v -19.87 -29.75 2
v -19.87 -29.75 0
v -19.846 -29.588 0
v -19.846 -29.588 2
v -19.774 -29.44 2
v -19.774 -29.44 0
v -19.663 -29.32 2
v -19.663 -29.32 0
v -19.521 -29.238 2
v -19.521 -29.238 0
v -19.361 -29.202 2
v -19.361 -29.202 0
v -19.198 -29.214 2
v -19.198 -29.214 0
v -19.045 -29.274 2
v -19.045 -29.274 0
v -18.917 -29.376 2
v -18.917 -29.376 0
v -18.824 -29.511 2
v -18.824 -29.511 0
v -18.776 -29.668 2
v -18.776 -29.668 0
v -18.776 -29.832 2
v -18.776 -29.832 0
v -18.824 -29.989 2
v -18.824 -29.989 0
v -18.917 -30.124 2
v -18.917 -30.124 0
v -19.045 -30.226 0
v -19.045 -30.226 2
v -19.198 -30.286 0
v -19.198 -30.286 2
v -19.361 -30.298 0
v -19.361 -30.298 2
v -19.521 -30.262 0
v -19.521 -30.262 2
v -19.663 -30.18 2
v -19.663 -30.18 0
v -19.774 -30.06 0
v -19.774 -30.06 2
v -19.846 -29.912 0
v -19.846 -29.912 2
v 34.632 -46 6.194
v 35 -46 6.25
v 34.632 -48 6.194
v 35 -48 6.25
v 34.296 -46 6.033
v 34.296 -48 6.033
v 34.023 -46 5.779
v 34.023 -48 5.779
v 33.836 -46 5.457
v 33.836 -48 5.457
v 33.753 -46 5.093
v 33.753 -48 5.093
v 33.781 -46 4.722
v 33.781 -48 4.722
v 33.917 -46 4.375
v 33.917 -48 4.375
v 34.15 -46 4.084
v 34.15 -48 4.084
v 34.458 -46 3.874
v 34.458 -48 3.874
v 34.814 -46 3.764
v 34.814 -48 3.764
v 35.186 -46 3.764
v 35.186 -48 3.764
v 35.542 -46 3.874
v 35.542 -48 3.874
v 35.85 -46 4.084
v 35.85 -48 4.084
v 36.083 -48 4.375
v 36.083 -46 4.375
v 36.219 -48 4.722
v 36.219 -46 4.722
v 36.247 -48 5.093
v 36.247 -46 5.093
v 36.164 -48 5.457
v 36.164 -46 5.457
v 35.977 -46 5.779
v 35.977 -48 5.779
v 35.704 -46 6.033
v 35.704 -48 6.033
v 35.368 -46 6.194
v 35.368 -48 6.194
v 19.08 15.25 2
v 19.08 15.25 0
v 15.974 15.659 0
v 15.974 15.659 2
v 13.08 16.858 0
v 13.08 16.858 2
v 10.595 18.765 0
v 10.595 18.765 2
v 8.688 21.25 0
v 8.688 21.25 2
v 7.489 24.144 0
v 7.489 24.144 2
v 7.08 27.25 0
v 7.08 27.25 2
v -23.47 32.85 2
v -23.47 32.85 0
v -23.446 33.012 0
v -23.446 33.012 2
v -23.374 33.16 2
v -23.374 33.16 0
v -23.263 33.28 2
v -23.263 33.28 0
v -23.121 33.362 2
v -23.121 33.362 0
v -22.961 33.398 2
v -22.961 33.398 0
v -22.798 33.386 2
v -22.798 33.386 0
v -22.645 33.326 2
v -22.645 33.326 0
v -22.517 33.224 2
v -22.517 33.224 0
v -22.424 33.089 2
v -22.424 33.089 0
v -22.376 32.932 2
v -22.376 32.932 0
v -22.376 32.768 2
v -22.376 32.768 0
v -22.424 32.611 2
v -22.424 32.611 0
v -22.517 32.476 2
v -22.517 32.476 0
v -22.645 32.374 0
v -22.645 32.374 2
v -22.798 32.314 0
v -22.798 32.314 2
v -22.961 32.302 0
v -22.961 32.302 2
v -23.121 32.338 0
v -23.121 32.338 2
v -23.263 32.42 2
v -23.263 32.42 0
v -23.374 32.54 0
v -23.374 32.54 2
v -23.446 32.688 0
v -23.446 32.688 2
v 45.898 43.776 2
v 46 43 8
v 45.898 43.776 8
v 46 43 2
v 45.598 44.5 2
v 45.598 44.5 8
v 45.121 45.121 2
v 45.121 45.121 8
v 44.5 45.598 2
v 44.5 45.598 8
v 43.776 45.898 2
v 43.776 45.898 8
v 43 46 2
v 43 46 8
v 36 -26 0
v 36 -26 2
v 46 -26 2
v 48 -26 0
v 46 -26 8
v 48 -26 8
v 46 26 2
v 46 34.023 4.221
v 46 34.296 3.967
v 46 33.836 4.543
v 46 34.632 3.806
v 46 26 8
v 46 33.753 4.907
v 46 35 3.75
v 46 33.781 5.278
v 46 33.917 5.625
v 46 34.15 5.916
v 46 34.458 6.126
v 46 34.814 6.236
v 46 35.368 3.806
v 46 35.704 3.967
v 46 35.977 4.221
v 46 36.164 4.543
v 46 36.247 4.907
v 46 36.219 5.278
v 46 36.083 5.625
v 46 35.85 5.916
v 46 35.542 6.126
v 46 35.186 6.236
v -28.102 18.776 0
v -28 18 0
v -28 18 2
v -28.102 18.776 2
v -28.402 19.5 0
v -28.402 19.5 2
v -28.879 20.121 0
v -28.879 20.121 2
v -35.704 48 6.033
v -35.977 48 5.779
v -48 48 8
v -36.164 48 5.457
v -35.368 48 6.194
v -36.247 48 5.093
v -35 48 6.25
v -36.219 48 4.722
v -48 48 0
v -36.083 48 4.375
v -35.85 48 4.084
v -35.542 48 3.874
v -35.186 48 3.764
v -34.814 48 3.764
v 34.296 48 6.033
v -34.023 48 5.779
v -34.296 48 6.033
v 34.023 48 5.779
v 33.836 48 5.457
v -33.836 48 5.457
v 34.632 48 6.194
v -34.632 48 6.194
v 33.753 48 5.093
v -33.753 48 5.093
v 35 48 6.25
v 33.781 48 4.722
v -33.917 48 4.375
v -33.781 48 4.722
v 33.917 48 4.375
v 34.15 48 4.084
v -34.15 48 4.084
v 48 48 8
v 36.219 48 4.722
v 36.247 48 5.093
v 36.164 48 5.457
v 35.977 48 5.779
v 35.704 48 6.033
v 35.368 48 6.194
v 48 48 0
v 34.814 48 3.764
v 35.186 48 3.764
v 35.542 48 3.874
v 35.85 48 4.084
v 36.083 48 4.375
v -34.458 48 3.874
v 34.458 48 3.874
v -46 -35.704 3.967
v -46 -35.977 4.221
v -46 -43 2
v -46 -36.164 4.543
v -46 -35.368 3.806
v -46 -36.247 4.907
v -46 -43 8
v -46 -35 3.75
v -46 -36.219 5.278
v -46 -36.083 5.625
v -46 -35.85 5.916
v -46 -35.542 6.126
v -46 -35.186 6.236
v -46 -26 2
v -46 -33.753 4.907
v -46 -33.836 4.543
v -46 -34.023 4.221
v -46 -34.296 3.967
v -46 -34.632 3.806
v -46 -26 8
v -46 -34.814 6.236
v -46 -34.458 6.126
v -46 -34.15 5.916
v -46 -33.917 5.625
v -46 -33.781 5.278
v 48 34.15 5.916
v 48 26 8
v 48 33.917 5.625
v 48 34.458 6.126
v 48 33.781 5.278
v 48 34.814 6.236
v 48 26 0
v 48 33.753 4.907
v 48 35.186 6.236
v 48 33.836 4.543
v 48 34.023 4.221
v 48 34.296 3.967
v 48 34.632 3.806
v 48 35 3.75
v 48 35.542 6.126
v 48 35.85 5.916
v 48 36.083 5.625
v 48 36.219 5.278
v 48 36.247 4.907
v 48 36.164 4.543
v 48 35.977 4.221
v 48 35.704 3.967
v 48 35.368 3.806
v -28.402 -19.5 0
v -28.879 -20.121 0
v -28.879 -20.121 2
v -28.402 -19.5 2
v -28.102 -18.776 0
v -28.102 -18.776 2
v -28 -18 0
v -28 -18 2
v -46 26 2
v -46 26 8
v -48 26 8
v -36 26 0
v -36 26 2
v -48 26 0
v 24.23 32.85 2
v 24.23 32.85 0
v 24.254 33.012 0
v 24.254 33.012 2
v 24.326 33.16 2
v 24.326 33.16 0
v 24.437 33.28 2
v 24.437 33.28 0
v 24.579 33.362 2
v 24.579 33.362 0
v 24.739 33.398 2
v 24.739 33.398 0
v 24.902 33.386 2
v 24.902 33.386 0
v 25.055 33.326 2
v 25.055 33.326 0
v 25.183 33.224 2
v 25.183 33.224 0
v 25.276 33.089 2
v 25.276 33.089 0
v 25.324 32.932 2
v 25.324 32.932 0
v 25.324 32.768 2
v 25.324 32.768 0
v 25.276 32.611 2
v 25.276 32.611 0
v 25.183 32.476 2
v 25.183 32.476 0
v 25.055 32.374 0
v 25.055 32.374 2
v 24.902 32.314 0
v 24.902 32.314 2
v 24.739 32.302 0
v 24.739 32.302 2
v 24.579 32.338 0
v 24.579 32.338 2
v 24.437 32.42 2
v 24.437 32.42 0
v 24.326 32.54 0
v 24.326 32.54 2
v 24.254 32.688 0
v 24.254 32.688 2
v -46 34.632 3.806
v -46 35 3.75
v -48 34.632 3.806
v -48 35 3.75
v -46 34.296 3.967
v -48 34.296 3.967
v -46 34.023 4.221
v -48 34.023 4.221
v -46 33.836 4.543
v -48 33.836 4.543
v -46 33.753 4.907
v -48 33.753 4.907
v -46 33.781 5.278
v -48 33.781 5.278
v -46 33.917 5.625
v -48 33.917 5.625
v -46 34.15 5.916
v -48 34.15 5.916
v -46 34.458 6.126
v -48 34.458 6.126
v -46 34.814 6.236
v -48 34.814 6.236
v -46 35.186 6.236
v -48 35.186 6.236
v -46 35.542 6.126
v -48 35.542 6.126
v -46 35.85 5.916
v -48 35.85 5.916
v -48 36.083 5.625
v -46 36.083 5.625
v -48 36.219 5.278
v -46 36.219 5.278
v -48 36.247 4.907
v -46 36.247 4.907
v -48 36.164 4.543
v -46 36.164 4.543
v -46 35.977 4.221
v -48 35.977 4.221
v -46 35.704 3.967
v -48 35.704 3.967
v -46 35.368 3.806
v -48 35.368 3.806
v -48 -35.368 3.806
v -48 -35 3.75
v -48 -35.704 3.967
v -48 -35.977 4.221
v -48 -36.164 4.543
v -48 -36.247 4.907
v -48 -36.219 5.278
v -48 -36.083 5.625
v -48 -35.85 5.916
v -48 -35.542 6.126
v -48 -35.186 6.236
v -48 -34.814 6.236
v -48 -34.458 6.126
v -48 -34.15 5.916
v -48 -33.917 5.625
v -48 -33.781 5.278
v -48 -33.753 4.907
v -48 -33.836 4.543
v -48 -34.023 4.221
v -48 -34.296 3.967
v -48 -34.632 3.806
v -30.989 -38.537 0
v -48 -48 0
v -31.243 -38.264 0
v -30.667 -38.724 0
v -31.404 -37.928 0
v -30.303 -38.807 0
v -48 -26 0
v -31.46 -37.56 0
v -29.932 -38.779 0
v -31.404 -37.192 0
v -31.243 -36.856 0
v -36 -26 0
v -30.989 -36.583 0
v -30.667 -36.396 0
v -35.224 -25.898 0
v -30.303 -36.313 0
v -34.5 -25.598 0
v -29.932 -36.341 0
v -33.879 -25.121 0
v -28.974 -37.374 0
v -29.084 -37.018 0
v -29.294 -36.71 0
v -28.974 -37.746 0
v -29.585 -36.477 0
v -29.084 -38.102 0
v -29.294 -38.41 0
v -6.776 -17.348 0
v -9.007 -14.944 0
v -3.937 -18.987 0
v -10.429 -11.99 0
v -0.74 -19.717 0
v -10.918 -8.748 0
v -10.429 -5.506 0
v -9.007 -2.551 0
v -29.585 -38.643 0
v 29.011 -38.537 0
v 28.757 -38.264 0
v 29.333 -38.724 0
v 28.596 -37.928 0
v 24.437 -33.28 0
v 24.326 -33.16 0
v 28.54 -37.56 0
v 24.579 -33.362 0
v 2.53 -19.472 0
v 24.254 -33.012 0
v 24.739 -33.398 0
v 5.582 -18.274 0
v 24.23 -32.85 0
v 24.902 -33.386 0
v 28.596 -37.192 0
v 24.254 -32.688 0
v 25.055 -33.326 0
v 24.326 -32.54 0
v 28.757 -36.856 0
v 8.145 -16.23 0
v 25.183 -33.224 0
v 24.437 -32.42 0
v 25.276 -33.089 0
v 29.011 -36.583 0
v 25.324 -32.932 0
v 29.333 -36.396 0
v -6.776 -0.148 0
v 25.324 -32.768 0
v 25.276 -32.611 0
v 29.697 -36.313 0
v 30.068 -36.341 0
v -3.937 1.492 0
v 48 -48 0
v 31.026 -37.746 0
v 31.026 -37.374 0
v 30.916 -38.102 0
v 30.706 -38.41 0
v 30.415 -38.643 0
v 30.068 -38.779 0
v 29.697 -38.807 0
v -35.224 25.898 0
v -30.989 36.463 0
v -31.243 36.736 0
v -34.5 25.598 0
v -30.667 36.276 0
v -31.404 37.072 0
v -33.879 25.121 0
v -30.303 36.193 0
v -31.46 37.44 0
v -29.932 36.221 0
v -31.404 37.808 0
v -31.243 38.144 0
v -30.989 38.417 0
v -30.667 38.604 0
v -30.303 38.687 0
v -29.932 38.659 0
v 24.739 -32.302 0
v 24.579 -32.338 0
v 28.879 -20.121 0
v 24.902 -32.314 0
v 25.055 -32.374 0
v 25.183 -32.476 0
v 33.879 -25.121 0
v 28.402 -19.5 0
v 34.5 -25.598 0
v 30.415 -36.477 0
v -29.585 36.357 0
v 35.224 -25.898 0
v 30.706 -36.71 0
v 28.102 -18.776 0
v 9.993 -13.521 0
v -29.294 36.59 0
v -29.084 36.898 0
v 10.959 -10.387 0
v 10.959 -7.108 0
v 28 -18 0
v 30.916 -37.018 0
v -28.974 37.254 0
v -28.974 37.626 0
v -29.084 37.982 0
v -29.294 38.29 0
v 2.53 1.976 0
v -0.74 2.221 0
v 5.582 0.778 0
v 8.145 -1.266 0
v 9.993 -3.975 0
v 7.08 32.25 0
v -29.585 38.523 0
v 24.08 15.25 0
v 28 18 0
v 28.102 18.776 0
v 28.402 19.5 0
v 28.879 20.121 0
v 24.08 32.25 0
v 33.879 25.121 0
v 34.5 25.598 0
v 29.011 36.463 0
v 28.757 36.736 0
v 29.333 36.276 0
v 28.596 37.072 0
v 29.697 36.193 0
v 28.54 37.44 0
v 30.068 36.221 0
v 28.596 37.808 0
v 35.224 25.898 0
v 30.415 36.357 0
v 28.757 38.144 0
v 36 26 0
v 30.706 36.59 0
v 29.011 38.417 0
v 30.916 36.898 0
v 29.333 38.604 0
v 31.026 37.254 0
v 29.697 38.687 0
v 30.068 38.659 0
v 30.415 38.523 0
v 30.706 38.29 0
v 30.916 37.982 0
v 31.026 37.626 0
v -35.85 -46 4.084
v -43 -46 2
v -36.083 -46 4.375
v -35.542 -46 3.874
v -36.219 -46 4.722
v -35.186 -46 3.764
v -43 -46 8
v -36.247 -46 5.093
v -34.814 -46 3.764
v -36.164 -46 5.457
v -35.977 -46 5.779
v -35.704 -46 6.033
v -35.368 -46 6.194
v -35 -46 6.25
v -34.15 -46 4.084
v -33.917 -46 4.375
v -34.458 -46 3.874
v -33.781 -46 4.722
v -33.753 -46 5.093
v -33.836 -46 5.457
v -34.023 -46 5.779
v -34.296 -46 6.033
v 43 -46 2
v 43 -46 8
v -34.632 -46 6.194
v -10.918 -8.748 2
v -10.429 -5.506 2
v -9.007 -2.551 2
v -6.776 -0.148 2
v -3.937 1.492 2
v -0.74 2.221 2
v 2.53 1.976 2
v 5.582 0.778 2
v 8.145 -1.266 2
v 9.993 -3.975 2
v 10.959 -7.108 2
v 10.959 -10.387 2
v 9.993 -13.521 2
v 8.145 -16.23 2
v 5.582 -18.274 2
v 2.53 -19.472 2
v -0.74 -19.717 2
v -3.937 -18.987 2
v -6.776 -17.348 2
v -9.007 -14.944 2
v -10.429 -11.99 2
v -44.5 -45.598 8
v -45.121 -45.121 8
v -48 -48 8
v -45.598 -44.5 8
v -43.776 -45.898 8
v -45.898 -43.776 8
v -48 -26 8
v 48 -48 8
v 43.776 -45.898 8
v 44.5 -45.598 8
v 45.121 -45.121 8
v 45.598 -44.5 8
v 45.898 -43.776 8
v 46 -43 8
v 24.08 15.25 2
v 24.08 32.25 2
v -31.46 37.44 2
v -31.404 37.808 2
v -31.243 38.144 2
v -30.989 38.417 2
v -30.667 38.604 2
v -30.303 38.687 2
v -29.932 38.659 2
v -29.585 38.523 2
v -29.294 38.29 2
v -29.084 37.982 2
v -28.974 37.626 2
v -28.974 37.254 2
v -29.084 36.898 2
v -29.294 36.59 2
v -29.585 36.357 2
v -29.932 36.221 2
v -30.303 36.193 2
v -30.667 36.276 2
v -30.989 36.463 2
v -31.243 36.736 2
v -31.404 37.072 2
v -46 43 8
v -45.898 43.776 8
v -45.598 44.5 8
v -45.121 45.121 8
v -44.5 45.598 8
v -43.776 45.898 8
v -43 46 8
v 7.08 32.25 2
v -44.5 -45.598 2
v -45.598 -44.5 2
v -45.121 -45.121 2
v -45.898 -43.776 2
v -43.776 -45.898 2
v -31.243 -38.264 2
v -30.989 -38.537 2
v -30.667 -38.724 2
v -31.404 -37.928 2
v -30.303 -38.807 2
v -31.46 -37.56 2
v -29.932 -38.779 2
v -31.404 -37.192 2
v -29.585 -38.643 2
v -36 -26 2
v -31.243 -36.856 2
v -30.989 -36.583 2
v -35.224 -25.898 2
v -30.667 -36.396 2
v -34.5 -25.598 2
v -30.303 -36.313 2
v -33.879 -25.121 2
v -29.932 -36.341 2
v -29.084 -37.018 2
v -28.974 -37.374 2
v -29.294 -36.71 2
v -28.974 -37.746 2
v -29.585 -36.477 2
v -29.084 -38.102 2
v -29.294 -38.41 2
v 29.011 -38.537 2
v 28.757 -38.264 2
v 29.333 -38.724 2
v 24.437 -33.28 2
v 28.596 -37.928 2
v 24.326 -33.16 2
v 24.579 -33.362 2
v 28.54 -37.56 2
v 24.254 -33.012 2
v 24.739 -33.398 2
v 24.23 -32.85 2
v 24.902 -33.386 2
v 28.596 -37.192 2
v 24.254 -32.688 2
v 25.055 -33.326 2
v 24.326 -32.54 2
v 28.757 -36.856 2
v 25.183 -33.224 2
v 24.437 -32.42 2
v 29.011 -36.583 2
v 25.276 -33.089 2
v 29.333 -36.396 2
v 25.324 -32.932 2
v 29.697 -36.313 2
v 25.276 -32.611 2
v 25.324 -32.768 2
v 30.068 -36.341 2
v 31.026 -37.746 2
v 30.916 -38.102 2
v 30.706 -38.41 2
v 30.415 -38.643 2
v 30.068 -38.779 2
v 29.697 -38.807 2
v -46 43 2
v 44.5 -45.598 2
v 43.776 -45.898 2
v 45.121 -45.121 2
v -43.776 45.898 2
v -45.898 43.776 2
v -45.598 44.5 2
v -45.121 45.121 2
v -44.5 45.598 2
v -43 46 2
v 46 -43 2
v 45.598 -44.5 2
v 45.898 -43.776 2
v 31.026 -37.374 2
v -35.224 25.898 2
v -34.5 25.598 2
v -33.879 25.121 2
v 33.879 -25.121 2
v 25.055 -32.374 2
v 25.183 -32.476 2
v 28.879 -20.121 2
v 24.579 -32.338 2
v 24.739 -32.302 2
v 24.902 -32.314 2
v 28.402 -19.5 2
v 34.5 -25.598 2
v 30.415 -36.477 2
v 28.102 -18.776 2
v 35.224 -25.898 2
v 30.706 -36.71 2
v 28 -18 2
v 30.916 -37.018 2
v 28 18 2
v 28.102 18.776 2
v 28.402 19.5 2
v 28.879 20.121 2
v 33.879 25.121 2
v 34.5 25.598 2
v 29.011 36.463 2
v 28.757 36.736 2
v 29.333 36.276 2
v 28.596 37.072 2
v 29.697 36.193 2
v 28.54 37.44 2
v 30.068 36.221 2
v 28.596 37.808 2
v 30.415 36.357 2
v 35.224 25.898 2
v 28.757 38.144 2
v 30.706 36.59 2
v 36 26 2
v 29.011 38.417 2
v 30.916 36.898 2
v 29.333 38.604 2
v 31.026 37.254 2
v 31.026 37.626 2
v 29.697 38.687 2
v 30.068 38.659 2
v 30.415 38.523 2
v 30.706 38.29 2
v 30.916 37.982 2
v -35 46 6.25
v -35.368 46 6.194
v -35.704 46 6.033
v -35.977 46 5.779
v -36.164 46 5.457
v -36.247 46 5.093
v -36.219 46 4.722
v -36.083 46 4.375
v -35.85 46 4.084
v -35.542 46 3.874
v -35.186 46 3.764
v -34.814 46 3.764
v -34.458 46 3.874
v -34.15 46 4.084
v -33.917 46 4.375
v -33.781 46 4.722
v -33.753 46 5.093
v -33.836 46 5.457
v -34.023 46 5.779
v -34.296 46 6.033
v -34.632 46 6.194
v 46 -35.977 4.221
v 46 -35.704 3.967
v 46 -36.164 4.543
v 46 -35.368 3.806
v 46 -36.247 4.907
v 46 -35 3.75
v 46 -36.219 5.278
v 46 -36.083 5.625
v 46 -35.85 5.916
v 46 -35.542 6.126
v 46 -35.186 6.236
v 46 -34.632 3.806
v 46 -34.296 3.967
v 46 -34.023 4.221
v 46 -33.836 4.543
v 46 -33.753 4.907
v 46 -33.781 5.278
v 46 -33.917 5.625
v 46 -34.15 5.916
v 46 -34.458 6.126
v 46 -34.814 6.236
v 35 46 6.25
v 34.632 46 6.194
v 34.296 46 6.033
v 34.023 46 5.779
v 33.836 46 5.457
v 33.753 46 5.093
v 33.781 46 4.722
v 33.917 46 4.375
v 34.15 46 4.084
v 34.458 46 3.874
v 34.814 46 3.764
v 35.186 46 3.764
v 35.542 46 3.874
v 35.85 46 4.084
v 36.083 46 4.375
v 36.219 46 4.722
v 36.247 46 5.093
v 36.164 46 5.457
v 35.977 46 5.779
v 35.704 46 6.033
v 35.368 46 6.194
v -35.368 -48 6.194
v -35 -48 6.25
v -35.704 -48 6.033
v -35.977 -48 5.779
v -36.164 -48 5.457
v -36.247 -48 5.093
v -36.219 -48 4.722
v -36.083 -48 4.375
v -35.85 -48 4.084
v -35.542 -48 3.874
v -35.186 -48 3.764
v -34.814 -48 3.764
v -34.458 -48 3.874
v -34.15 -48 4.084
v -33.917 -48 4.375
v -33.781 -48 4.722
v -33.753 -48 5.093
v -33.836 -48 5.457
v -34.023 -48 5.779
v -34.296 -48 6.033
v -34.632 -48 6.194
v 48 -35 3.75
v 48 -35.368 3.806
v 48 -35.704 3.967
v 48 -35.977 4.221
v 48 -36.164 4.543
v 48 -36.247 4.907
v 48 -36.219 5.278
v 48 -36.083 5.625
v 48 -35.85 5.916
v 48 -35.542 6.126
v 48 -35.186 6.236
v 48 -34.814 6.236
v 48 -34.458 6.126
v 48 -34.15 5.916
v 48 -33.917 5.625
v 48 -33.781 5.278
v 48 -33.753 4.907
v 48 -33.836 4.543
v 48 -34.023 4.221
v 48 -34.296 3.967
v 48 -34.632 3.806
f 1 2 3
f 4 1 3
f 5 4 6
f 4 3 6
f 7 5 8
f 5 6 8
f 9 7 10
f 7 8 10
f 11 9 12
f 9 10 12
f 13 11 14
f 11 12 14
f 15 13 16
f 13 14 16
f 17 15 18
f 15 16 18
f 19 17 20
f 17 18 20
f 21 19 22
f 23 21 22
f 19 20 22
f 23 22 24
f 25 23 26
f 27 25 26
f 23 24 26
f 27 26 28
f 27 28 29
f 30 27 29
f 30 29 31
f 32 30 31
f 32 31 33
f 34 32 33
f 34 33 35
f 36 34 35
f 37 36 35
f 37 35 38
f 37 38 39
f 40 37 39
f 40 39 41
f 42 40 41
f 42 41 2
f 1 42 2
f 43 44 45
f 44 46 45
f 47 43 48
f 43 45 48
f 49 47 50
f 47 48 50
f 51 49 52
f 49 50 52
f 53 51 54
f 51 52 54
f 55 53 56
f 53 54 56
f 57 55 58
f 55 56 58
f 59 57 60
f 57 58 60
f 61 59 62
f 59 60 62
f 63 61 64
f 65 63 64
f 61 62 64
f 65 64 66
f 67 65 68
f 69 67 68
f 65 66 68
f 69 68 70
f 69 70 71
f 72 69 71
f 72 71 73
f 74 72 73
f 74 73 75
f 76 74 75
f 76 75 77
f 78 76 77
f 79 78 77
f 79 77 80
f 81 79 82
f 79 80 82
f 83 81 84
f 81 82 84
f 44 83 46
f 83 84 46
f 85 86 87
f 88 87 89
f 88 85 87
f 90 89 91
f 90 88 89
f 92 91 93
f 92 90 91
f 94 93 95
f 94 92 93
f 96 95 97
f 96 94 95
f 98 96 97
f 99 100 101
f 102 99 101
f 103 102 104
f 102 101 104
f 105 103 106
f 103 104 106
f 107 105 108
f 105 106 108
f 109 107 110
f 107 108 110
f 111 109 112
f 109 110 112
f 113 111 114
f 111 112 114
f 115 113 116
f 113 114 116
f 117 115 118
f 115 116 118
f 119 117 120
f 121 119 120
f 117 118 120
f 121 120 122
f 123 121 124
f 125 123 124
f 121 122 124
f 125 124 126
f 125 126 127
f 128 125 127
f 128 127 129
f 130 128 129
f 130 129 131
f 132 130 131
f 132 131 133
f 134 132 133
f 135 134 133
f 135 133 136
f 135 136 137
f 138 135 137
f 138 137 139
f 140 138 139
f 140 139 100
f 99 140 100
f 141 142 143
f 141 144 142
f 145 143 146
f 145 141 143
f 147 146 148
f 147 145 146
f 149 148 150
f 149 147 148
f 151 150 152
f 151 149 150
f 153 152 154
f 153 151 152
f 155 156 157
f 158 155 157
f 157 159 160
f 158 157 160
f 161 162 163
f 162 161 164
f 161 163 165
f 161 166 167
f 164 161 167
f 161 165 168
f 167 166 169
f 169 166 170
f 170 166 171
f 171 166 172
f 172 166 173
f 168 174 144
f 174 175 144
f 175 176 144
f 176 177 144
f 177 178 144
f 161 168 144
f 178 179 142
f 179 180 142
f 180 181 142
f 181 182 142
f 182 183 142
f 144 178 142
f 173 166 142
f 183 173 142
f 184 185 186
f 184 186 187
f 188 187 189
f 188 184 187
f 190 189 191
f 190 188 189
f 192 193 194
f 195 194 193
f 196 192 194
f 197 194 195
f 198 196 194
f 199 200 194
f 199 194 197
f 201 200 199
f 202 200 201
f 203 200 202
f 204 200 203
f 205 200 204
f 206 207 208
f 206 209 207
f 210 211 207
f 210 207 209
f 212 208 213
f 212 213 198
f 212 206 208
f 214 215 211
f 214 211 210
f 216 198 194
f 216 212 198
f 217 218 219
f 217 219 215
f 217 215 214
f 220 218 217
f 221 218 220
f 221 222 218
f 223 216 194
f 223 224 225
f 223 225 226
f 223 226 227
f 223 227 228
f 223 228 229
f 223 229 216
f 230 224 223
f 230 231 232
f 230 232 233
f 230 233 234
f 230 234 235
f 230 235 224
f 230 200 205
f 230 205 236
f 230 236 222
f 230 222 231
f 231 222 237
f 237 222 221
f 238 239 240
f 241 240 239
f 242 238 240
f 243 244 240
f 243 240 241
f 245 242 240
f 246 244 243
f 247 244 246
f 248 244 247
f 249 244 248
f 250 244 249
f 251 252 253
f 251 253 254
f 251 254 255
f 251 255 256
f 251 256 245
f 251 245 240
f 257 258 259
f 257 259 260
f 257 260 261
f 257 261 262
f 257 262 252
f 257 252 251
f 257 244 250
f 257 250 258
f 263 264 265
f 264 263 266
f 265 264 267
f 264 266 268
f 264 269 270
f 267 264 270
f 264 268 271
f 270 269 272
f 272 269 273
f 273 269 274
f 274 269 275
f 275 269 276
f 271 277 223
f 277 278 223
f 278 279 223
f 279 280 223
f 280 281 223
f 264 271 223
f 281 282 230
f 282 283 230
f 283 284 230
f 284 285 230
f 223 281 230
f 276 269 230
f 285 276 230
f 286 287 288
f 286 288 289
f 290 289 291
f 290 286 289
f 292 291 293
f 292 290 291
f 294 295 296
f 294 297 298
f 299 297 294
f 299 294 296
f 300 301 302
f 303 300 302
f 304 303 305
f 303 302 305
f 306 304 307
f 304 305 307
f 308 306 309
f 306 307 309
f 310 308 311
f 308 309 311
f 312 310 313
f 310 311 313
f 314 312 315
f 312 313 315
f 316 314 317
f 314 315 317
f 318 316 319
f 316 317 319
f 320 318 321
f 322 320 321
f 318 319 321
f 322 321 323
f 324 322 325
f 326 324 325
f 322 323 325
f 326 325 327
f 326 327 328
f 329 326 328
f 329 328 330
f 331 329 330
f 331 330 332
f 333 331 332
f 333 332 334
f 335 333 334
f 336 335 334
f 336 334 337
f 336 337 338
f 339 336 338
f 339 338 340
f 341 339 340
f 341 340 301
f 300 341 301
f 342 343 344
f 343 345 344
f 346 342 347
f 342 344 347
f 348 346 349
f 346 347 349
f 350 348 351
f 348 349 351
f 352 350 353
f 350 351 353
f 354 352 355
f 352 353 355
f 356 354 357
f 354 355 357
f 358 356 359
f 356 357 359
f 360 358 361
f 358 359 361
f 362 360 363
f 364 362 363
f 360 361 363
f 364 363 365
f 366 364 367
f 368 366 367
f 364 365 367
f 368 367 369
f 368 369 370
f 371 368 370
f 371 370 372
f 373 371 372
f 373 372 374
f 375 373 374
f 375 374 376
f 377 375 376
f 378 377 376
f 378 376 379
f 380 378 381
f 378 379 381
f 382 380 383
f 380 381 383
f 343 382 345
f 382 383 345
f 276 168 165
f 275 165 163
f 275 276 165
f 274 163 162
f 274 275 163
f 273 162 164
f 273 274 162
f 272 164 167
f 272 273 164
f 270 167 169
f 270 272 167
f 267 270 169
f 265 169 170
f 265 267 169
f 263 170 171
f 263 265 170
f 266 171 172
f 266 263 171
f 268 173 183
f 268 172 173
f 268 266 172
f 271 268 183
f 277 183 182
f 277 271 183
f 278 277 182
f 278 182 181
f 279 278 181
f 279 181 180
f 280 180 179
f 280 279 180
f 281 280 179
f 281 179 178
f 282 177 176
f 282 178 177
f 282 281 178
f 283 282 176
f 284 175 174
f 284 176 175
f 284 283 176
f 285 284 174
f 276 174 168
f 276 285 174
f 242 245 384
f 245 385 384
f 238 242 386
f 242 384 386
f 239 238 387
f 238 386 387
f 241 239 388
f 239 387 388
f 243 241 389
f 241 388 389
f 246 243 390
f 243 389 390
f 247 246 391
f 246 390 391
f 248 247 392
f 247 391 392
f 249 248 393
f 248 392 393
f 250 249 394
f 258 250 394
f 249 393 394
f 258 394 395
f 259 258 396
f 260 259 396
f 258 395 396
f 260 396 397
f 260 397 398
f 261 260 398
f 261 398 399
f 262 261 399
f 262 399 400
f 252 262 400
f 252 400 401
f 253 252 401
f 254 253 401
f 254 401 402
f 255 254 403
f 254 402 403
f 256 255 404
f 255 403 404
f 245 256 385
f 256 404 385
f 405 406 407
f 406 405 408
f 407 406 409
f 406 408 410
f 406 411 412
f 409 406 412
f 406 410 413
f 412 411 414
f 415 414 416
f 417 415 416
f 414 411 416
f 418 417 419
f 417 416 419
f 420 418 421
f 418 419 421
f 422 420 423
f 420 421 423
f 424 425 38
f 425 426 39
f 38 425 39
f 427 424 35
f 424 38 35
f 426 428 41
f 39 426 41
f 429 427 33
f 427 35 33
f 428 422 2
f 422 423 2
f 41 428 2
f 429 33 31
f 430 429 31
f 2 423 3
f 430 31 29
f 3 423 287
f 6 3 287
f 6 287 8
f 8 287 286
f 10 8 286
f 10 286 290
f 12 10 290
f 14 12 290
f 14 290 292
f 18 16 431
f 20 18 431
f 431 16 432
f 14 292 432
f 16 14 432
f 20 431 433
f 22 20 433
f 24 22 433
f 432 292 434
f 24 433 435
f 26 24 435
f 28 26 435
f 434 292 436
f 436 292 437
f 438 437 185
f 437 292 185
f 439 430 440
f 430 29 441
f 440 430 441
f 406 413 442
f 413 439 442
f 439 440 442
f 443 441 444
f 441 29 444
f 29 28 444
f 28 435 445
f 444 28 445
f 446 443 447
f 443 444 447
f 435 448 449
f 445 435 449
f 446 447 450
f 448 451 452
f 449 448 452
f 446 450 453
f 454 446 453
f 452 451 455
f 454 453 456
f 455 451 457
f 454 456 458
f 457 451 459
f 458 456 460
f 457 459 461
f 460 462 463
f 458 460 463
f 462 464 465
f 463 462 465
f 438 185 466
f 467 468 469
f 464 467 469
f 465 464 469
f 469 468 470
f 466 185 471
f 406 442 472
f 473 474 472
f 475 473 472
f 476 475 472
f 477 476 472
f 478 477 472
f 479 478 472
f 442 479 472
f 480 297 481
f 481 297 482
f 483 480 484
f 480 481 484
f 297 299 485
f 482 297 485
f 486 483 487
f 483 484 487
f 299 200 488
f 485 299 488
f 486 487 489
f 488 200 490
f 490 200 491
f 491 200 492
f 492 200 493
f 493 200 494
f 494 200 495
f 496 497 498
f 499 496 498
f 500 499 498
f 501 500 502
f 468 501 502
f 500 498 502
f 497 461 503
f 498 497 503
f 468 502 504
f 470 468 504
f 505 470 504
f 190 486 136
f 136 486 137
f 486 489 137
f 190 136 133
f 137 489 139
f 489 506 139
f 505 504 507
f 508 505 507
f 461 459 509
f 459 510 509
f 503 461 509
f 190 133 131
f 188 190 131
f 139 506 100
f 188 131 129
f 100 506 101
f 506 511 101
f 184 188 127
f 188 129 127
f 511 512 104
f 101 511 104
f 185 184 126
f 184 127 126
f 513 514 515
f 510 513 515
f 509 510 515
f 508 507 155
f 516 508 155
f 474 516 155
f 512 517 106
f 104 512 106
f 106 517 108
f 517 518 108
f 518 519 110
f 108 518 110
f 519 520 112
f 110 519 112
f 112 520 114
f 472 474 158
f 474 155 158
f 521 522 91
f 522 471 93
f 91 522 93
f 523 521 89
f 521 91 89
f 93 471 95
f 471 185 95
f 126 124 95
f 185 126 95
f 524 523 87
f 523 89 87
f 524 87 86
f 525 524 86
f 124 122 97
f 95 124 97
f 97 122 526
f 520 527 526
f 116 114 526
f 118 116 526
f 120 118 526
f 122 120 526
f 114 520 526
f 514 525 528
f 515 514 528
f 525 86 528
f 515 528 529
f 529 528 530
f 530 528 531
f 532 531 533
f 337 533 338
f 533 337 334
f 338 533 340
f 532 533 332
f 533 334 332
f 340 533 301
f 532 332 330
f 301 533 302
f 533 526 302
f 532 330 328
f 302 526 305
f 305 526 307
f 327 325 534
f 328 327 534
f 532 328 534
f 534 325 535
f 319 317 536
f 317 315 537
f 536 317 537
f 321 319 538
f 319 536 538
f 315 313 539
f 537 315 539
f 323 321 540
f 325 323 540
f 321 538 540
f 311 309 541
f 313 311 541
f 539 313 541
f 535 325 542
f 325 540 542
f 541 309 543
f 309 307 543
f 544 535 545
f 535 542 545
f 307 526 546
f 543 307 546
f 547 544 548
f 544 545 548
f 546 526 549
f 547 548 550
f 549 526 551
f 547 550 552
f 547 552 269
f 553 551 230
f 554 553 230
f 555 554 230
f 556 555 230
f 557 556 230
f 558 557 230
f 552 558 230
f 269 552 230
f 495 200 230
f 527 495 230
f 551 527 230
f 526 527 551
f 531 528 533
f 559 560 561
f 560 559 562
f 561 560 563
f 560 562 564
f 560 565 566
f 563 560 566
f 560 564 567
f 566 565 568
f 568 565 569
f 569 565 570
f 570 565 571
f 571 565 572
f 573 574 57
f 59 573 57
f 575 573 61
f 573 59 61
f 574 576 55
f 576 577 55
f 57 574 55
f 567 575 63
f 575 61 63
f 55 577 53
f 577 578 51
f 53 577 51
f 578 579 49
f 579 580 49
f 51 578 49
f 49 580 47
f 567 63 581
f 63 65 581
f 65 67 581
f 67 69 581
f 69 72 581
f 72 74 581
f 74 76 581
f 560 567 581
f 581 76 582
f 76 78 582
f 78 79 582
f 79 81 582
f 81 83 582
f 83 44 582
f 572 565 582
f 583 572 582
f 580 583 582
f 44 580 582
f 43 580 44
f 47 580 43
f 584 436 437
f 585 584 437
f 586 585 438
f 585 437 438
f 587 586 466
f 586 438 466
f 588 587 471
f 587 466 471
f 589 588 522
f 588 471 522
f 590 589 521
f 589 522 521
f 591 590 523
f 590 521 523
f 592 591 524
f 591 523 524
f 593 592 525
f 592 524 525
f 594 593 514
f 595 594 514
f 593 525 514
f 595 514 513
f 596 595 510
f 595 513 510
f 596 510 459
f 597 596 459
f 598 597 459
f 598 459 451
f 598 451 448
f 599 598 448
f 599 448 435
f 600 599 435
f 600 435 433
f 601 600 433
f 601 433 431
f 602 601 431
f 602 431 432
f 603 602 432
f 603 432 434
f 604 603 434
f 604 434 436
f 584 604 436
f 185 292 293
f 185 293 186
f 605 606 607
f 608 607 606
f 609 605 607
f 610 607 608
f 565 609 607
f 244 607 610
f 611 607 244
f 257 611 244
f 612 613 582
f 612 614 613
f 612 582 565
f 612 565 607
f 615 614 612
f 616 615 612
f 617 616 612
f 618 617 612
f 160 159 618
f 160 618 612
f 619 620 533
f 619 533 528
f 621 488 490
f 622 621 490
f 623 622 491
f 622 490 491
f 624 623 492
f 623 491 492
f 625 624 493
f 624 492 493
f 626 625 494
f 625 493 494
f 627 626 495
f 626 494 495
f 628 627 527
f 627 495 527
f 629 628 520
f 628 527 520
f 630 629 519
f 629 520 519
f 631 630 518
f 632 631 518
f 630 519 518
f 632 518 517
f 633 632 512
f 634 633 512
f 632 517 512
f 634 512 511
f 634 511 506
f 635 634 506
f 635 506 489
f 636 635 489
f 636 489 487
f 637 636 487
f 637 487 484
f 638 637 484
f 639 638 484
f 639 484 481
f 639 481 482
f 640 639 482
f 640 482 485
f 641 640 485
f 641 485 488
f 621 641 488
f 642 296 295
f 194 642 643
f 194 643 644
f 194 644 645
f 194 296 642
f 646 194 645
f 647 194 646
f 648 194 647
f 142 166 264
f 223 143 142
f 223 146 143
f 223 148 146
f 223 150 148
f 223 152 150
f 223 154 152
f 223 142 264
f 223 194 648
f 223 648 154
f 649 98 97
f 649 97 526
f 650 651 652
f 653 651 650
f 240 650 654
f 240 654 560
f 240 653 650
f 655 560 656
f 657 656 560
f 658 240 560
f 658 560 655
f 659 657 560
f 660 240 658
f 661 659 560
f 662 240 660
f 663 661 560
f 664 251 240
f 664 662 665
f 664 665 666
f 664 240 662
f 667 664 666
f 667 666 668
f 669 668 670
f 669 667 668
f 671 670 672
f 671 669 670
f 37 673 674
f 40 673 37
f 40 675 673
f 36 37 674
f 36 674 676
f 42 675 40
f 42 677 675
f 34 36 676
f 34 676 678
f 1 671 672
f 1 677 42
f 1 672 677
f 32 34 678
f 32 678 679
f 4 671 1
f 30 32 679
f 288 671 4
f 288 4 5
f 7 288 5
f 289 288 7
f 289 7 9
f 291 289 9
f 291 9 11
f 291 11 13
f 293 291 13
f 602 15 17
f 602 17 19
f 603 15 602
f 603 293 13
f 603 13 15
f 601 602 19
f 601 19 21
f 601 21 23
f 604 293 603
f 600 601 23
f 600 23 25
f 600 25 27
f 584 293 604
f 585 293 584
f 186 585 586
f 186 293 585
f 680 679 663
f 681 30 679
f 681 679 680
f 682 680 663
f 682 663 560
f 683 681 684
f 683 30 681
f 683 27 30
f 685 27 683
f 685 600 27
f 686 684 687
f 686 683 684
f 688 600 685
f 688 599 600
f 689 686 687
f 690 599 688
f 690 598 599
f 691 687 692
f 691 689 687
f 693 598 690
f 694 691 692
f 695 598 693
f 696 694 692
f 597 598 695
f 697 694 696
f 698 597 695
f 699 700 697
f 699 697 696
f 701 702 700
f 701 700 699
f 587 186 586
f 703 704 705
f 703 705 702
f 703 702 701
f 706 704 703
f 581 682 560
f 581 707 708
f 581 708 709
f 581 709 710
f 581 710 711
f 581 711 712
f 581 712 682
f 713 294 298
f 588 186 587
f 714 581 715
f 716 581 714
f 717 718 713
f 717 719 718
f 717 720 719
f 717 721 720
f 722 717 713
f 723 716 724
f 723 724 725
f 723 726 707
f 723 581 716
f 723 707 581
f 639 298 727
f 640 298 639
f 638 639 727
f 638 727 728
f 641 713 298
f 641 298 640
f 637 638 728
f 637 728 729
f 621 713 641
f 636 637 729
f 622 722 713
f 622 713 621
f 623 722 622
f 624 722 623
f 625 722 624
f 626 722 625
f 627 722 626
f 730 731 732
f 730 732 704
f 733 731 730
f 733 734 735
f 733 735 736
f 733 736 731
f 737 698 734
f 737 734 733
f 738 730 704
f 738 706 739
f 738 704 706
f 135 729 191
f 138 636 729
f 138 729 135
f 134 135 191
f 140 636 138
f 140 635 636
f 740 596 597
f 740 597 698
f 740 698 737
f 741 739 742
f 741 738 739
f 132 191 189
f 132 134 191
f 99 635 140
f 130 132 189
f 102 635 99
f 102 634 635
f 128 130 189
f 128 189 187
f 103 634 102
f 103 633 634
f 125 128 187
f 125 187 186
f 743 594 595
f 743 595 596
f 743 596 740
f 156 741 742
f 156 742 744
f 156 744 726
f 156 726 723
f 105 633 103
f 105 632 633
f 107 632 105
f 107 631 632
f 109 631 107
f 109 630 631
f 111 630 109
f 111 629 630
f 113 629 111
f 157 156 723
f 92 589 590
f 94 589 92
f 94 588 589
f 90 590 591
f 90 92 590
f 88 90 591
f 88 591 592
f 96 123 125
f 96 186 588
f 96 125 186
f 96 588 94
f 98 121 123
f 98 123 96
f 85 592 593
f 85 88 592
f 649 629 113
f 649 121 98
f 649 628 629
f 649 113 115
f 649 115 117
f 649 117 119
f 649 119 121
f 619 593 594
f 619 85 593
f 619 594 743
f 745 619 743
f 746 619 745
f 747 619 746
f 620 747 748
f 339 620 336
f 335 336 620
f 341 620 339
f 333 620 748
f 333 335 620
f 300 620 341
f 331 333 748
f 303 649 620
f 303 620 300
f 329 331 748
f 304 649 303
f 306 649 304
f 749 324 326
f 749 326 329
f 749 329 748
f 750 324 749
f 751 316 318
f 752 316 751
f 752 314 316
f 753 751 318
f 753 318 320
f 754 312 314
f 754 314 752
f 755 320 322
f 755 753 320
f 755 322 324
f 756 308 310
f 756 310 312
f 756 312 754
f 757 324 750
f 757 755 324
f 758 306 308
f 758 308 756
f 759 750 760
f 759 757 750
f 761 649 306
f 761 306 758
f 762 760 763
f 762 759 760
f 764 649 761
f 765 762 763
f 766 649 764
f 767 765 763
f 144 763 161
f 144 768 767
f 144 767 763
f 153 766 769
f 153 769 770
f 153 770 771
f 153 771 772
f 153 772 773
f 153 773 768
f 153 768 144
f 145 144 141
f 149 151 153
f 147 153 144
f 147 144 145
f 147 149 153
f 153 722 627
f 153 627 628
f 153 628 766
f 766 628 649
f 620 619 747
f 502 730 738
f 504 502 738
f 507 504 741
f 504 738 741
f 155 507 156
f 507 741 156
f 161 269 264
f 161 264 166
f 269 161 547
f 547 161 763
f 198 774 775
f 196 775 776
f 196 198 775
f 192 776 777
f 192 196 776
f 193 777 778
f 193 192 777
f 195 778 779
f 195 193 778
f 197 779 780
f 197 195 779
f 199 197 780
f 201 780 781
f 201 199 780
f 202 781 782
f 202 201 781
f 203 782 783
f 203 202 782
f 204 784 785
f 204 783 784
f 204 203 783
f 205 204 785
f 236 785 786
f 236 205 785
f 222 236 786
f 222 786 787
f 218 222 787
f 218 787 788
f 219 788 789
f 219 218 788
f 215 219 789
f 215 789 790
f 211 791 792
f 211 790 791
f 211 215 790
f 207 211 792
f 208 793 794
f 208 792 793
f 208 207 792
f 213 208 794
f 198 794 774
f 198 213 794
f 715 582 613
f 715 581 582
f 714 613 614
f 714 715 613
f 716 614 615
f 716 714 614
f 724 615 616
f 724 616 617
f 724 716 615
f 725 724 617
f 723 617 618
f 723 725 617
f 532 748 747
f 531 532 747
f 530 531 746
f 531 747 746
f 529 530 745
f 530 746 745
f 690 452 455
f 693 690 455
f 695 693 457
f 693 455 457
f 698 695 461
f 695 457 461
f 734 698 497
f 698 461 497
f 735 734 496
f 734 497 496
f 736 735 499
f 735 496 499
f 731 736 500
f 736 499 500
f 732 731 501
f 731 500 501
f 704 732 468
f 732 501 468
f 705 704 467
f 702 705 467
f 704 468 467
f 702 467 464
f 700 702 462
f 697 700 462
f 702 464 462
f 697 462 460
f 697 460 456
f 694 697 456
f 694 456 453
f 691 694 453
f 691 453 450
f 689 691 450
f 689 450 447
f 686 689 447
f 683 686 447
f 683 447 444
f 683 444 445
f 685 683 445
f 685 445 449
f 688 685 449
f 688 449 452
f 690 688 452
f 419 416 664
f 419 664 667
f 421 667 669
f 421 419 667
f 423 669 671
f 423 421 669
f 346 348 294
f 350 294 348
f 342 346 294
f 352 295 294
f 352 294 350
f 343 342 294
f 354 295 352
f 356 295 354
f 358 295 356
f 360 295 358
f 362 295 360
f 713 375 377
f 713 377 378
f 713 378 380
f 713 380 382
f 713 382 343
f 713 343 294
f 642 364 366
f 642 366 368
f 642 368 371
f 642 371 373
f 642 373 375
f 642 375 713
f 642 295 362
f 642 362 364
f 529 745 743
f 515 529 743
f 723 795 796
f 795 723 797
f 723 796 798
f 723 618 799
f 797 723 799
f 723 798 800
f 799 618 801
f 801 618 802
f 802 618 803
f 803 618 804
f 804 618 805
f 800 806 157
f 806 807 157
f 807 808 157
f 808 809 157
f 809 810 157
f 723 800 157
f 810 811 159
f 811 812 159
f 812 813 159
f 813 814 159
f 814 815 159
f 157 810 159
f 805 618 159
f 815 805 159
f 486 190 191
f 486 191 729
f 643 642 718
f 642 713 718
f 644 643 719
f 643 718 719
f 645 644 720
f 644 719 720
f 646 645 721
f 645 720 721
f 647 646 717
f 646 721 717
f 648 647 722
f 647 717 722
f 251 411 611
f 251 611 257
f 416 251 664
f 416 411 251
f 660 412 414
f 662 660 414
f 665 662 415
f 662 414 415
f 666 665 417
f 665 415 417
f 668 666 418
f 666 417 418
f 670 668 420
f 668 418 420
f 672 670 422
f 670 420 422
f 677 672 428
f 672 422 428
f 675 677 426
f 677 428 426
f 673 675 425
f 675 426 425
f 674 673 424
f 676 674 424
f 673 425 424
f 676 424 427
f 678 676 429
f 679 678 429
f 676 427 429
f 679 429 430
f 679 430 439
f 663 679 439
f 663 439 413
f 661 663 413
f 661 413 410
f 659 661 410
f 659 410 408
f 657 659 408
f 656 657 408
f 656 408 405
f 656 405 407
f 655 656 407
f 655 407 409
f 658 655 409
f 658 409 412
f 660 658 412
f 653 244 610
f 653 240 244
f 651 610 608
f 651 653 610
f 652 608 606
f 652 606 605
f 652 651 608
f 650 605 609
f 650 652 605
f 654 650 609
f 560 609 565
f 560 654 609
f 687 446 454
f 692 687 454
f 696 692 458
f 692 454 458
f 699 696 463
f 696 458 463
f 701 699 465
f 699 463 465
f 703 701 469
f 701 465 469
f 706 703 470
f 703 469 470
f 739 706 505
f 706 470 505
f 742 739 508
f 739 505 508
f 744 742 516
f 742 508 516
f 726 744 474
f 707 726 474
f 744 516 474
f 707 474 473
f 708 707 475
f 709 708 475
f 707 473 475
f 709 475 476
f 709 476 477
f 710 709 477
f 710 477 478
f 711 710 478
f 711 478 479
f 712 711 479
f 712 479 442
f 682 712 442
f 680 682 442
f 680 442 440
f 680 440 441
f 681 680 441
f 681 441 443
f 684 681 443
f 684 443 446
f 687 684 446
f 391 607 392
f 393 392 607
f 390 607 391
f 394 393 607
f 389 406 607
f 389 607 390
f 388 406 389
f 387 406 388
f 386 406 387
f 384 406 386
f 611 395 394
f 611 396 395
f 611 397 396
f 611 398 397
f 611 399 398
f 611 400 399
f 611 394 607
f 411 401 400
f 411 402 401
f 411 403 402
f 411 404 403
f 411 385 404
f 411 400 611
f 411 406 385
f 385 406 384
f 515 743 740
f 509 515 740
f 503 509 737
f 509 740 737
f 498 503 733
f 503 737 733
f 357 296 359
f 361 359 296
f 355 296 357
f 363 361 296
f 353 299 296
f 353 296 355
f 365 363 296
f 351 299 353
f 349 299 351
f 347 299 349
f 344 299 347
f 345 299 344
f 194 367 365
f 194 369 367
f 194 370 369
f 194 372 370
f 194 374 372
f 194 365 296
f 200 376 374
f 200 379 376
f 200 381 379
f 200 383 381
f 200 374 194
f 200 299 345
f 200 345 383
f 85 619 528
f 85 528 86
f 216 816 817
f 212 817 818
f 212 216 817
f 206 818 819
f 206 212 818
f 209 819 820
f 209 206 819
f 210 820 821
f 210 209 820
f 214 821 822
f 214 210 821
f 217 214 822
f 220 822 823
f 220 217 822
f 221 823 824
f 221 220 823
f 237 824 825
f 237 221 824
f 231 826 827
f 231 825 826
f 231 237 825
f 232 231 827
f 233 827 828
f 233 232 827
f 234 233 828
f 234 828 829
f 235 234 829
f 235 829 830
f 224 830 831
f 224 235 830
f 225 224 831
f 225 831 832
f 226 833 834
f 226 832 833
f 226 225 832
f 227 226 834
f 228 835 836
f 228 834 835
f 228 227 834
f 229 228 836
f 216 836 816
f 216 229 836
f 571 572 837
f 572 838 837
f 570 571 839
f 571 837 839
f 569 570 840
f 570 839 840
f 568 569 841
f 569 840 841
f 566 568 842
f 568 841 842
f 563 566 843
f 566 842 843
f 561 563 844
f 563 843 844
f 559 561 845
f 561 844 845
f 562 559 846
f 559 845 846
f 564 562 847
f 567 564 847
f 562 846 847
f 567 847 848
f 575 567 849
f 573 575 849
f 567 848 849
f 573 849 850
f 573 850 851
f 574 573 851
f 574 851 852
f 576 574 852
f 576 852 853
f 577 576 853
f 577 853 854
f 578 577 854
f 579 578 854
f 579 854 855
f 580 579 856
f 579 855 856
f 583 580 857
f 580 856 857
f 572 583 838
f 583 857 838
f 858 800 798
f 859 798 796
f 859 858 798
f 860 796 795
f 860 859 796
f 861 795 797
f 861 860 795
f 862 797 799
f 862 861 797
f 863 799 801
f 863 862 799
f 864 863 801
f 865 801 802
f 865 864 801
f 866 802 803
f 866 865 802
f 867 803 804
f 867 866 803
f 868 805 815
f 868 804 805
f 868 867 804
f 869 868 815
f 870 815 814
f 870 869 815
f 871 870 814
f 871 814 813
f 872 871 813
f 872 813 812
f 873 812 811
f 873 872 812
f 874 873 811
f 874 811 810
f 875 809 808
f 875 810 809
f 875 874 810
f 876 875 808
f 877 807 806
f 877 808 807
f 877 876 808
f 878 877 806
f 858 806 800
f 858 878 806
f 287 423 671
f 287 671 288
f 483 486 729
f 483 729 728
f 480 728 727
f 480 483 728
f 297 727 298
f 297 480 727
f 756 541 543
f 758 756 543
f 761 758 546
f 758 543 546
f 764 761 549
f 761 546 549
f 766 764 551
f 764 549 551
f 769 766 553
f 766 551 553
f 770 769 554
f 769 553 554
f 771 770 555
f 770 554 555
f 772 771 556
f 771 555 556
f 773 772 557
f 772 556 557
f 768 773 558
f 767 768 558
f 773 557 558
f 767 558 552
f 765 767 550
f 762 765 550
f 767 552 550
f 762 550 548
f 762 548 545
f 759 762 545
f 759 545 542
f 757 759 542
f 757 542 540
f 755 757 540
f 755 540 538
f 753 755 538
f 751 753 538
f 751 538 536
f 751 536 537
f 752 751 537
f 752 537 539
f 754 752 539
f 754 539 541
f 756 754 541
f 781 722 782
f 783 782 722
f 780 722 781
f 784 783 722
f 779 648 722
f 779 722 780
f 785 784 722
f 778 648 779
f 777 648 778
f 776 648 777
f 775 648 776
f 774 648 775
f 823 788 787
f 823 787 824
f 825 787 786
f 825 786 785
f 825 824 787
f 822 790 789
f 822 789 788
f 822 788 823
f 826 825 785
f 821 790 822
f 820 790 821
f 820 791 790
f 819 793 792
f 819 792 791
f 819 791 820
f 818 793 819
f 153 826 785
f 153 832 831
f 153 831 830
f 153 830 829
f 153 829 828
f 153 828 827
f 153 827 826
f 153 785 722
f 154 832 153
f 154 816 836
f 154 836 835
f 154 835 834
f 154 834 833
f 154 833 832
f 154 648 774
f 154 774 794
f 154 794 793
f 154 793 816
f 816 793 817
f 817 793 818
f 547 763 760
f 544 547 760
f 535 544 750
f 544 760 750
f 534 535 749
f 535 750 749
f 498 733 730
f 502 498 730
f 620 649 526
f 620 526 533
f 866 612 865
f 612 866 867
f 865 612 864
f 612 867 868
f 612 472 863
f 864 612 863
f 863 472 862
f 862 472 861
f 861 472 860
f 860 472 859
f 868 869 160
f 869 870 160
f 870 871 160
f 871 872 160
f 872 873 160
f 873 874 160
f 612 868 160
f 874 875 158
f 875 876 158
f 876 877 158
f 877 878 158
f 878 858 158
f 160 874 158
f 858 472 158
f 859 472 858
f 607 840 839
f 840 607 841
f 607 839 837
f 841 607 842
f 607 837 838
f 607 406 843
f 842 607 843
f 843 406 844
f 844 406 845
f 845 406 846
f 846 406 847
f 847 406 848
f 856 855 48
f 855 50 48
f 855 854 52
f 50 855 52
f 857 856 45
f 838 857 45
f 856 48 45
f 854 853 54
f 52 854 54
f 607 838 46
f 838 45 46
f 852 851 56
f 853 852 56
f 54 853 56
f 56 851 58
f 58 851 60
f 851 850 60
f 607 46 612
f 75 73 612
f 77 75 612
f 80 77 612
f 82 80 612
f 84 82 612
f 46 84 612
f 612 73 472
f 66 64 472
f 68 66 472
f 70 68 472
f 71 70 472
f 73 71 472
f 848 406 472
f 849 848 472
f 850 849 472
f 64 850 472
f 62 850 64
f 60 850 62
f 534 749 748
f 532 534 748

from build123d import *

# Parameters (mm, degrees)
SKETCH1_W                      = 96
SKETCH1_H                      = 96
BOSS_EXTRUDE1_DEPTH            = 8
SKETCH2_W                      = 92
SKETCH2_H                      = 92
COMPONENT_PLATFORM_DEPTH       = 6
CABLE_SLOTS_DEPTH              = 6
INNER_CORNER_FILLETS_R         = 3
M3X0_5_TAPPED_HOLE1_AT_2_COUNT = 2
M3X0_5_TAPPED_HOLE1_AT_2_PITCH = 70
M3X0_5_TAPPED_HOLE2_AT_2_COUNT = 2
M3X0_5_TAPPED_HOLE2_AT_2_PITCH = 70
M1_4X0_3_TAPPED_HOLE1_D        = 1.1
M1_4X0_3_TAPPED_HOLE1_DEPTH    = 3.7
M1_4X0_3_TAPPED_HOLE1_TIP      = 0.33047334
SKETCH29_R                     = 11
HDD_EXTRUSION_CUTOUT_DEPTH     = 10
HDD_EXTRUSION_CUTOUT_2_DEPTH   = 10
M3X0_5_TAPPED_HOLE3_D          = 2.5
M3X0_5_TAPPED_HOLE3_DEPTH      = 10
M3X0_5_TAPPED_HOLE3_TIP        = 0.751075774


with BuildPart() as part:
    # Sketch1 → Boss-Extrude1 (new body)
    with BuildSketch(Plane.XY):
        Rectangle(SKETCH1_W, SKETCH1_H)
    extrude(amount=BOSS_EXTRUDE1_DEPTH)

    # Sketch2 → Component Platform (cut)
    with BuildSketch(Plane.XY.offset(8)):
        Rectangle(SKETCH2_W, SKETCH2_H)
    extrude(amount=-COMPONENT_PLATFORM_DEPTH, mode=Mode.SUBTRACT)

    # Sketch3 → Cable Slots (cut, symmetric)
    with BuildSketch(Plane.XY.offset(2)):
        with BuildLine():
            Line((-33.878679656, -25.121320344), (-28.878679656, -20.121320344))
            ThreePointArc((-28.878679656, -20.121320344), (-28.228361402, -19.148050297), (-28, -18))
            Line((-28, -18), (-28, 18))
            ThreePointArc((-28, 18), (-28.228361402, 19.148050297), (-28.878679656, 20.121320344))
            Line((-28.878679656, 20.121320344), (-33.878679656, 25.121320344))
            ThreePointArc((-33.878679656, 25.121320344), (-34.851949703, 25.771638598), (-36, 26))
            Line((-36, 26), (-48, 26))
            Line((-48, 26), (-48, -26))
            Line((-48, -26), (-36, -26))
            ThreePointArc((-36, -26), (-34.851949703, -25.771638598), (-33.878679656, -25.121320344))
        make_face()
        with BuildLine():
            Line((48, -26), (48, 26))
            Line((48, 26), (36, 26))
            ThreePointArc((36, 26), (34.851949703, 25.771638598), (33.878679656, 25.121320344))
            Line((33.878679656, 25.121320344), (28.878679656, 20.121320344))
            ThreePointArc((28.878679656, 20.121320344), (28.228361402, 19.148050297), (28, 18))
            Line((28, 18), (28, -18))
            ThreePointArc((28, -18), (28.228361402, -19.148050297), (28.878679656, -20.121320344))
            Line((28.878679656, -20.121320344), (33.878679656, -25.121320344))
            ThreePointArc((33.878679656, -25.121320344), (34.851949703, -25.771638598), (36, -26))
            Line((36, -26), (48, -26))
        make_face()
    extrude(amount=CABLE_SLOTS_DEPTH, both=True, mode=Mode.SUBTRACT)

    # Inner Corner Fillets
    inner_corner_fillets_edges = [part.edges().sort_by_distance(p)[0] for p in [
        (-46, -46, 5),
        (-46, 46, 5),
        (46, 46, 5),
        (46, -46, 5),
    ]]
    fillet(inner_corner_fillets_edges, radius=INNER_CORNER_FILLETS_R)

    # Sketch14 → M3x0.5 Tapped Hole1 (revolve, cut)
    with BuildSketch(Plane(origin=(48, -35, 5), x_dir=(0, 0, -1), z_dir=(0, 1, 0))):
        Polygon((0, 0), (0, 10.751075774), (1.25, 10), (1.25, 0), align=None)
    m3x0_5_tapped_hole1 = revolve(axis=Axis((54.35, -35, 5), (-1, 0, 0)), mode=Mode.SUBTRACT)

    # M3x0.5 Tapped Hole1 at 2: M3x0.5 Tapped Hole1 ×2
    with Locations(*[(0, i * M3X0_5_TAPPED_HOLE1_AT_2_PITCH, 0) for i in range(1, M3X0_5_TAPPED_HOLE1_AT_2_COUNT)]):
        add(m3x0_5_tapped_hole1, mode=Mode.SUBTRACT)

    # Sketch16 → M3x0.5 Tapped Hole2 (revolve, cut)
    with BuildSketch(Plane(origin=(35, 48, 5), x_dir=(0, 0, 1), z_dir=(1, 0, 0))):
        Polygon((0, 0), (0, 10.751075774), (1.25, 10), (1.25, 0), align=None)
    m3x0_5_tapped_hole2 = revolve(axis=Axis((35, 54.35, 5), (0, -1, 0)), mode=Mode.SUBTRACT)

    # M3x0.5 Tapped Hole2 at 2: M3x0.5 Tapped Hole2 ×2
    with Locations(*[(-i * M3X0_5_TAPPED_HOLE2_AT_2_PITCH, 0, 0) for i in range(1, M3X0_5_TAPPED_HOLE2_AT_2_COUNT)]):
        add(m3x0_5_tapped_hole2, mode=Mode.SUBTRACT)

    # Mirror1: M3x0.5 Tapped Hole1 across plane
    add(m3x0_5_tapped_hole1.mirror(Plane(origin=(0, 0, 0), x_dir=(0, 0, 1), z_dir=(1, 0, 0))), mode=Mode.SUBTRACT)

    # Mirror1 copy 1 sketch → Mirror1 copy 1 (revolve, cut)
    with BuildSketch(Plane(origin=(-48, 35, 5), x_dir=(0, 0, -1), z_dir=(0, 1, 0))):
        Polygon((0, 0), (0, -10.751075774), (1.25, -10), (1.25, 0), align=None)
    revolve(axis=Axis((-54.35, 35, 5), (-1, 0, 0)), mode=Mode.SUBTRACT)

    # Mirror2: M3x0.5 Tapped Hole2 across plane
    add(m3x0_5_tapped_hole2.mirror(Plane(origin=(0, 0, 0), x_dir=(0, 0, 1), z_dir=(0, -1, 0))), mode=Mode.SUBTRACT)

    # Mirror2 copy 1 sketch → Mirror2 copy 1 (revolve, cut)
    with BuildSketch(Plane(origin=(-35, -48, 5), x_dir=(0, 0, 1), z_dir=(1, 0, 0))):
        Polygon((0, 0), (0, -10.751075774), (1.25, -10), (1.25, 0), align=None)
    revolve(axis=Axis((-35, -54.35, 5), (0, -1, 0)), mode=Mode.SUBTRACT)

    # M1.4x0.3 Tapped Hole1
    with Locations(Plane.XY.offset(2)):
        with Locations((-19.31998517, -29.75), (24.78001483, -32.85), (24.78001483, 32.85), (-22.91998517, 32.85)):
            Hole(M1_4X0_3_TAPPED_HOLE1_D / 2, depth=M1_4X0_3_TAPPED_HOLE1_DEPTH)
            with Locations((0, 0, -(M1_4X0_3_TAPPED_HOLE1_DEPTH + M1_4X0_3_TAPPED_HOLE1_TIP / 2))):  # 118° drill point
                Cone(0, M1_4X0_3_TAPPED_HOLE1_D / 2, M1_4X0_3_TAPPED_HOLE1_TIP, mode=Mode.SUBTRACT)

    # Sketch29 → HDD Extrusion Cutout (cut)
    with BuildSketch(Plane(origin=(0, 0, 0), x_dir=(-1, 0, 0), z_dir=(0, 0, -1))):
        with Locations((-0.08192631, -8.74785827)):
            Circle(SKETCH29_R)
    extrude(amount=-HDD_EXTRUSION_CUTOUT_DEPTH, mode=Mode.SUBTRACT)

    # Sketch9 → HDD Extrusion Cutout 2 (cut)
    with BuildSketch(Plane.XY.offset(2)):
        with BuildLine():
            Line((24.08001483, 32.25), (24.08001483, 15.25))
            Line((24.08001483, 15.25), (19.08001483, 15.25))
            ThreePointArc((19.08001483, 15.25), (10.594733456, 18.764718626), (7.08001483, 27.25))
            Line((7.08001483, 27.25), (7.08001483, 32.25))
            Line((7.08001483, 32.25), (24.08001483, 32.25))
        make_face()
    extrude(amount=-HDD_EXTRUSION_CUTOUT_2_DEPTH, mode=Mode.SUBTRACT)

    # M3x0.5 Tapped Hole3
    with Locations(Plane.XY.offset(2)):
        with Locations((-30.20998517, -37.56), (29.79001483, -37.56), (29.79001483, 37.44), (-30.20998517, 37.44)):
            Hole(M3X0_5_TAPPED_HOLE3_D / 2, depth=M3X0_5_TAPPED_HOLE3_DEPTH)
            with Locations((0, 0, -(M3X0_5_TAPPED_HOLE3_DEPTH + M3X0_5_TAPPED_HOLE3_TIP / 2))):  # 118° drill point
                Cone(0, M3X0_5_TAPPED_HOLE3_D / 2, M3X0_5_TAPPED_HOLE3_TIP, mode=Mode.SUBTRACT)


solid = part.part
